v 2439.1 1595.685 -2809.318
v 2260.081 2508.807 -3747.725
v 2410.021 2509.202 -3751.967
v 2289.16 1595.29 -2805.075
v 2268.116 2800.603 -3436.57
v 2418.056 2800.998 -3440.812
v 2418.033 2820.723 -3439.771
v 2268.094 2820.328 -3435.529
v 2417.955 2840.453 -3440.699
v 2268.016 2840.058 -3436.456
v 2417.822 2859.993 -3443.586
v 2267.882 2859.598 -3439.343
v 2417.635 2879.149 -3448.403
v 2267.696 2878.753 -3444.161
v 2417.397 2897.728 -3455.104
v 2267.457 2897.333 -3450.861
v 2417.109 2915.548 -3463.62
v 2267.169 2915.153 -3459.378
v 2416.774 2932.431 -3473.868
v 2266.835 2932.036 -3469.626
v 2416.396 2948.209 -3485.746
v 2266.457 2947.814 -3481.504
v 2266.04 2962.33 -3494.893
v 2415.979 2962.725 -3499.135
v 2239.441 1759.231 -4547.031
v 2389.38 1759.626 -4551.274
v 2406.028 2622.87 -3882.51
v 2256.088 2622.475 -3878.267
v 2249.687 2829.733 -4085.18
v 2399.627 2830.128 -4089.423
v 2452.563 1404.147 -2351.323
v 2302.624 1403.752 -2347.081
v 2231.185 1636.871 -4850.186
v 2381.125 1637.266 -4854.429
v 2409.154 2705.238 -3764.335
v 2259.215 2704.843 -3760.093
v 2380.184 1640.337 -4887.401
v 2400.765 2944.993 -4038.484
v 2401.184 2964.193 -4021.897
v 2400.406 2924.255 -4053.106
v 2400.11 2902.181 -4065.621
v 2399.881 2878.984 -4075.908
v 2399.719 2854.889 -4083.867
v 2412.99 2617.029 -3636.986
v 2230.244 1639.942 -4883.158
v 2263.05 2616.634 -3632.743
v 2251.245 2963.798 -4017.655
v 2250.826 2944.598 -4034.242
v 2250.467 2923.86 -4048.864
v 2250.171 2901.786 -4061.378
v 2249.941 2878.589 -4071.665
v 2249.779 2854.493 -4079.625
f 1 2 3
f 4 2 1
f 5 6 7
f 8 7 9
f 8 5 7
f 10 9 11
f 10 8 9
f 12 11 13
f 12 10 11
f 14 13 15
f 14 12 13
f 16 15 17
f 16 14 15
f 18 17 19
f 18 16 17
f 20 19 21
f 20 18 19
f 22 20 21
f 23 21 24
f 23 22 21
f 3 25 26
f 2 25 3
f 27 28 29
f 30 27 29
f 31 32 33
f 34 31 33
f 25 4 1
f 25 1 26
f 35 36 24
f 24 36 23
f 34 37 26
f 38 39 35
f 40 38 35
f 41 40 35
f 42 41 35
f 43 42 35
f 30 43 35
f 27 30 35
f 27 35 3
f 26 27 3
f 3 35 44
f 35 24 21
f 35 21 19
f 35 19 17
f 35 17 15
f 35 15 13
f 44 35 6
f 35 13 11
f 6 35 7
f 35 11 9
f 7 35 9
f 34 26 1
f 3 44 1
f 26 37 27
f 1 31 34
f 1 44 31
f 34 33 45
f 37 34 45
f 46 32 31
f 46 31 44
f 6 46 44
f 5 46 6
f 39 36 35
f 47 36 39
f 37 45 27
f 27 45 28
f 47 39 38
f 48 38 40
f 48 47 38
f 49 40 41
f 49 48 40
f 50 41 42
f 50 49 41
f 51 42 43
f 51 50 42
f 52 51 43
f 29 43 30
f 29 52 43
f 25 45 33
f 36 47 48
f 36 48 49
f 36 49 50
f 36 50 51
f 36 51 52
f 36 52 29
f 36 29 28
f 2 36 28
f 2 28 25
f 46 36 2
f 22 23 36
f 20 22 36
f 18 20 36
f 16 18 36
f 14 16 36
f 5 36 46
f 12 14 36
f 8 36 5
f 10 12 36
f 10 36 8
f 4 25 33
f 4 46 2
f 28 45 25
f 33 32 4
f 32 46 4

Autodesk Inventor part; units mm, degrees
sketch "Sketch1" plane through (0, 0, 0) normal (0, 0, 1) x (1, 0, 0)
  line L0 (2948.6488, 634.5525) -> (2841.4489, 559.4904)
  line L1 (2841.4489, 559.4904) -> (2956.2003, 395.6085)
  line L2 (2956.2003, 395.6085) -> (3063.4001, 470.6706)
  line L3 (1051.1773, 2444.1167) -> (976.8907, 2338.0244)
  line L4 (976.8907, 2338.0244) -> (1140.7211, 2223.3091)
  line L5 (1140.7211, 2223.3091) -> (1215.0077, 2329.4014)
  line L6 (-383.8501, 3232.1868) -> (-383.8501, 3052.6308)
  arc A0 (4065.9398, -2152.4924) -> (-383.8501, 3052.6308) centre (-4485.4868, -4958.3977) ccw
  arc A1 (1051.1773, 2444.1167) -> (-383.8501, 3232.1868) centre (-3980.604, -5017.8654) ccw
  arc A2 (2948.6488, 634.5525) -> (1215.0077, 2329.4014) centre (-4152.392, -4894.9339) ccw
  arc A3 (4300.883, -1939.8955) -> (3063.4001, 470.6706) centre (-4233.2291, -4798.0297) ccw
  arc A4 (4065.9398, -2152.4924) -> (4300.883, -1939.8955) centre (3657.2708, -1464.7499) ccw
  point P0 (0, 0)
  point P1 (4065.924, -2152.4924)
  point P2 (4065.924, -2152.4924)
  dimension "d8" = 9000
  dimension "d9" = 9000
  dimension "d10" = 9000
  dimension "d11" = 9000
  dimension "d12" = 800
ref_plane "Work Plane2" through (0, 0, -7900) normal (0, 0, 1) x (1, 0, 0)
ref_plane "Work Plane1" through (0, 0, 0) normal (0, 0, 1) x (1, 0, 0)
sketch "Sketch2" plane through (0, 0, -7900) normal (0, 0, 1) x (1, 0, 0)
  arc A0 (895.257, 3171.2695) -> (-383.8658, 4018.7524) centre (-4697.1096, -3880.3569) ccw projected
  line L0 (-383.8658, 4018.7524) -> (-383.8658, 3839.1061) projected
  arc A1 (4065.924, -2152.4924) -> (-383.8658, 3839.1061) centre (-4733.9746, -4039.7614) ccw projected
  line L1 (895.257, 3171.2695) -> (830.4728, 3059.0601) projected
  line L2 (830.4728, 3059.0601) -> (1003.6891, 2959.0536) projected
  line L3 (1068.4733, 3071.2631) -> (1003.6891, 2959.0536) projected
  arc A2 (2750.1419, 1279.62) -> (1068.4733, 3071.2631) centre (-4591.4319, -3926.2703) ccw projected
  line L4 (2750.1419, 1279.62) -> (2643.8882, 1205.2246) projected
  line L5 (2643.8882, 1205.2246) -> (2759.146, 1041.7698) projected
  line L6 (2865.5448, 1116.2711) -> (2759.146, 1041.7698) projected
  arc A3 (4310.9102, -1926.005) -> (2865.5448, 1116.2711) centre (-4397.3898, -4198.7812) ccw projected
  arc A4 (4065.924, -2152.4924) -> (4310.9102, -1926.005) centre (3657.2831, -1464.7333) ccw
  point P0 (0, 0)
  dimension "d7" = 800
loft "Loft1" add profiles "Sketch1", "Sketch2"
ref_plane "Work Plane3" through (2500, 0, 0) normal (1, 0, 0) x (0, 1, 0)
sketch "Sketch3" plane through (2500, 0, 0) normal (1, 0, 0) x (0, 1, 0)
  line L0 (2569.5835, -3718.0946) -> (1551.2045, -2616.5476)
  line L1 (1551.2045, -2616.5476) -> (1738.7871, -4630.7013)
  line L2 (1738.7871, -4630.7013) -> (2569.5835, -3718.0946)
  line L3 (4228.9662, 279.606) -> (-2269.9695, 279.606)
  line L4 (-2269.9695, 279.606) -> (-2269.9695, -8192.2559)
  line L5 (-2269.9695, -8192.2559) -> (4228.9662, -8192.2559)
  line L6 (4228.9662, -8192.2559) -> (4228.9662, 279.606)
  point P0 (0, 0)
extrude "Extrusion1" cut sketch "Sketch3" along normal through all both and the other way through all
ref_plane "Work Plane4" through (1945.737, 1551.2045, -2616.5476) normal (0, -0.9956912, -0.0927309) x (1, 0, 0)
sketch "Sketch5" plane through (1945.737, 1551.2045, -2616.5476) normal (0, -0.9956912, -0.0927309) x (1, 0, 0)
  line L0 (347.8734, 0) -> (290.3896, -2022.8698)
  point P0 (-1945.737, 2749.1181)
ref_plane "Work Plane5" through (2293.6104, 1551.2045, -2616.5476) normal (-0.6425282, -0.7644369, -0.052856) x (-0.0284055, 0.0926935, -0.9952894)
sketch "Sketch6" plane through (2293.6104, 1551.2045, -2616.5476) normal (-0.6425282, -0.7644369, -0.052856) x (-0.0284055, 0.0926935, -0.9952894)
  line L0 (-1061.9028, -2252.9112) -> (2197.0944, -2252.9112)
  line L1 (2197.0944, -2252.9112) -> (2197.0944, 343.7273)
  line L2 (2197.0944, 343.7273) -> (-1061.9028, 343.7273)
  line L3 (-1061.9028, 343.7273) -> (-1061.9028, -2252.9112)
  point P0 (-2682.8576, -979.2829)
extrude "Extrusion2" cut sketch "Sketch6" against normal through all
ref_plane "Work Plane6" through (2293.6104, 1551.2045, -2616.5476) normal (-0.9995965, -0.0026341, 0.0282831) x (-0.0284055, 0.0926935, -0.9952894)
sketch "Sketch7" plane through (2293.6104, 1551.2045, -2616.5476) normal (-0.6425282, -0.7644369, -0.052856) x (-0.0284055, 0.0926935, -0.9952894)
  line L0 (0, 0) -> (1222.5973, -1418.5767) projected
  line L1 (1222.5973, -1418.5767) -> (2023.6864, 0) projected
  point P0 (-2682.8576, -979.2829)
sketch "Sketch8" plane through (2293.6104, 1551.2045, -2616.5476) normal (-0.9995965, -0.0026341, 0.0282831) x (-0.0284055, 0.0926935, -0.9952894)
  line L0 (0, 0) -> (1222.5973, -911.8435) projected
  spline S0 degree 4 poles (2023.6864, 0) (1891.4174, -0.0605) (1759.1485, -0.1112) (1626.8795, -0.1518) (1361.543, -0.2126) (1228.4756, -0.2325) (1095.4081, -0.2417) (831.8573, -0.2379) (701.374, -0.2253) (570.8907, -0.2017) (330.3055, -0.1374) (220.2037, -0.0999) (110.1018, -0.0542) (0, 0) knots 0 0 0 0 0 0.261442 0.261442 0.261442 0.524462 0.524462 0.524462 0.782374 0.782374 0.782374 1 1 1 1 1 projected
  line L1 (1222.5973, -911.8435) -> (2023.6864, 0) projected
  point P0 (-2682.8576, 1301.8858)
loft "Loft2" add profiles "Sketch8" section 1 edges at (1733.119, 2060.394, -3167.3211) (2264.5827, 1645.2339, -3623.5941) (1704.3771, 2154.1853, -4174.3979)
sketch "Sketch9" plane through (2293.6104, 1551.2045, -2616.5476) normal (-0.9995965, -0.0026341, 0.0282831) x (-0.0284055, 0.0926935, -0.9952894)
  line L0 (1222.5973, -911.8435) -> (0, 0) projected
  line L1 (2023.6864, 0) -> (1222.5973, -911.8435) projected
  spline S0 degree 4 poles (0, 0) (110.1018, -0.0542) (220.2037, -0.0999) (330.3055, -0.1374) (570.8907, -0.2017) (701.374, -0.2253) (831.8573, -0.2379) (1095.4081, -0.2417) (1228.4756, -0.2325) (1361.543, -0.2126) (1626.8795, -0.1518) (1759.1485, -0.1112) (1891.4174, -0.0605) (2023.6864, 0) knots 0 0 0 0 0 0.217626 0.217626 0.217626 0.475538 0.475538 0.475538 0.738558 0.738558 0.738558 1 1 1 1 1 projected
  point P0 (-2682.8576, 1301.8858)
extrude "Extrusion3" add sketch "Sketch9" against normal blind 1
sketch "Sketch10" plane through (2294.61, 1551.2071, -2616.5759) normal (0.9995965, 0.0026341, -0.0282831) x (-0.0284055, 0.0926935, -0.9952894)
  line L0 (2023.6864, 0) -> (1222.5973, 911.8435) projected
  line L1 (1222.5973, 911.8435) -> (0, 0) projected
  point P0 (-2682.8576, -1301.8858)
sketch "Sketch11" plane through (2294.61, 1551.2071, -2616.5759) normal (0.9995965, 0.0026341, -0.0282831) x (-0.0284055, 0.0926935, -0.9952894)
  line L0 (-1104.2744, 1764.8294) -> (3009.0866, 1764.8294)
  line L1 (3009.0866, 1764.8294) -> (3009.0866, -1120.984)
  line L2 (3009.0866, -1120.984) -> (-1104.2744, -1120.984)
  line L3 (-1104.2744, -1120.984) -> (-1104.2744, 1764.8294)
  point P0 (-2682.8576, -1301.8858)
extrude "Extrusion4" cut sketch "Sketch11" against normal through all
ref_plane "Work Plane7" through (2259.8815, 2572.4485, -3748.8579) normal (-0.9995965, -0.0026341, 0.0282831) x (0.02277, -0.6695833, 0.7423878)
sketch "Sketch12" plane through (2259.8815, 2572.4485, -3748.8579) normal (-0.9995965, -0.0026341, 0.0282831) x (0.02277, -0.6695833, 0.7423878)
  line L0 (1824.1754, 71.0087) -> (-191.8191, -1432.5702)
  line L1 (-191.8191, -1432.5702) -> (-218.3749, -1452.3762)
  line L2 (1355.6088, -93.5273) -> (-48.5024, -1138.6261)
  line L3 (-48.5024, -1138.6261) -> (43.4592, -46.5069)
  line L4 (-218.3749, -1452.3762) -> (-129.6551, -49.5311)
  line L5 (1824.1754, 71.0087) -> (56.688, 110.5959)
  line L6 (56.688, 110.5959) -> (79.2582, 378.6347)
  line L7 (-129.6551, -49.5311) -> (-422.1869, -34.2052)
  line L8 (-97.0049, 90.8023) -> (-72.3771, 459.6792)
  line L9 (-97.0049, 90.8023) -> (-461.7897, 110.5959)
  arc A0 (-461.7897, 110.5959) -> (-422.1869, -34.2052) centre (-203.8576, 103.3236) ccw
  arc A1 (79.2582, 378.6347) -> (-72.3771, 459.6792) centre (-80.6938, 261.7407) ccw
  line L10 (43.4592, -46.5069) -> (1355.6088, -93.5273)
  point P0 (4454.1178, 560.366)
  point P1 (0, 0)
  point P2 (1525.1894, 0)
  point P3 (-97.0049, -1209.8729)
  point P4 (1451.8368, -21.9036)
extrude "Extrusion5" add sketch "Sketch12" against normal blind 150
ref_plane "Work Plane8" through (2334.8512, 2572.6461, -3750.9792) normal (-0.9995965, -0.0026341, 0.0282831) x (0.02277, -0.6695833, 0.7423878)
sketch "Sketch14" plane through (2334.8512, 2572.6461, -3750.9792) normal (-0.9995965, -0.0026341, 0.0282831) x (0.02277, -0.6695833, 0.7423878)
  line L0 (1451.8368, -21.9036) -> (43.4592, -46.5069) projected
  line L1 (43.4592, -46.5069) -> (-48.5024, -1138.6261) projected
  line L2 (-48.5024, -1138.6261) -> (1355.6088, -93.5273) projected
  line L3 (-48.5024, -1138.6261) -> (43.4592, -46.5069) projected
  line L4 (36.357, -130.8518) -> (1354.1445, -94.6172)
  line L5 (29.9819, -206.5611) -> (1254.1697, -169.0298)
  line L6 (23.4479, -284.1574) -> (1145.7195, -249.7507)
  line L7 (16.9375, -361.4743) -> (1037.66, -330.1809)
  line L8 (11.2021, -429.586) -> (925.5677, -413.6127)
  line L9 (5.2661, -500.0812) -> (833.993, -481.773)
  line L10 (5.2661, -580.2648) -> (718.4048, -567.8068)
  line L11 (5.2661, -580.2648) -> (-1.4957, -580.383)
  line L12 (-7.9772, -657.3559) -> (615.2506, -644.5859)
  line L13 (-14.4897, -734.6974) -> (512.2276, -721.2673)
  line L14 (-20.8834, -810.6278) -> (426.4206, -798.3271)
  line L15 (-26.6611, -879.2427) -> (308.1889, -873.136)
  line L16 (-32.3399, -946.6834) -> (221.1278, -937.9367)
  line L17 (-37.3457, -1006.1304) -> (133.6992, -1003.011)
  line L18 (-41.9227, -1060.4869) -> (56.4792, -1060.4869)
  line L19 (1355.6088, -93.5273) -> (-48.5024, -1138.6261) projected
  line L20 (116.3671, -52.6461) -> (14.2049, -1091.9522)
  line L21 (190.5781, -52.6461) -> (82.9233, -1040.8042)
  line L22 (190.5781, -52.6461) -> (191.5287, -43.9202)
  line L23 (116.3671, -52.6461) -> (117.0971, -45.2205)
  line L24 (264.8096, -42.6401) -> (168.5004, -977.108)
  line L25 (335.0568, -41.4129) -> (244.4471, -920.5799)
  line L26 (405.5718, -40.181) -> (320.6833, -863.8362)
  line L27 (43.4592, -46.5069) -> (1451.8368, -21.9036) projected
  line L28 (494.8216, -38.6219) -> (401.4074, -815.2786)
  line L29 (584.5837, -37.0538) -> (494.8216, -734.2227)
  line L30 (673.0821, -35.5078) -> (584.5837, -667.4116)
  line L31 (761.0304, -33.9714) -> (682.5265, -594.5115)
  line L32 (845.2654, -32.4999) -> (776.3341, -524.6893)
  line L33 (922.1945, -31.156) -> (862.0055, -460.9229)
  line L34 (1000.074, -29.7955) -> (948.7353, -396.3688)
  line L35 (1079.0786, -28.4154) -> (1030.8888, -335.2208)
  line L36 (1150.7176, -27.1639) -> (1111.7893, -275.0055)
  line L37 (1222.0396, -25.918) -> (1192.3317, -215.0567)
  line L38 (1300.3477, -24.55) -> (1272.1344, -155.6584)
  line L39 (1372.2211, -23.2944) -> (1361.9285, -88.8235)
  point P0 (4454.1178, 560.366)
  point P1 (108.8756, -128.8578)
  point P2 (182.4957, -126.8335)
  point P3 (174.2918, -202.1368)
  point P4 (101.4529, -204.3699)
  point P5 (79.4317, -428.3941)
  point P6 (149.7761, -427.1652)
  point P7 (142.1618, -497.0569)
  point P8 (72.531, -498.5951)
  point P9 (49.4829, -733.0662)
  point P10 (116.6363, -731.354)
  point P11 (108.3871, -807.0729)
  point P12 (42.0287, -808.8978)
  point P13 (256.3417, -124.803)
  point P14 (326.6617, -122.8694)
  point P15 (318.9492, -197.7019)
  point P16 (248.6062, -199.8585)
  point P17 (240.6042, -277.4998)
  point P18 (310.9472, -275.3432)
  point P19 (302.9741, -352.7049)
  point P20 (232.6311, -354.8615)
  point P21 (225.3153, -425.8456)
  point P22 (295.5625, -424.6184)
  point P23 (288.4297, -493.8255)
  point P24 (218.149, -495.3782)
  point P25 (209.7685, -576.6923)
  point P26 (280.0157, -575.4652)
  point P27 (272.1674, -651.6157)
  point P28 (201.8983, -653.0555)
  point P29 (194.032, -729.3806)
  point P30 (264.3374, -727.5879)
  point P31 (256.5654, -802.9981)
  point P32 (186.2454, -804.9319)
  point P33 (750.2112, -111.2233)
  point P34 (834.565, -108.9039)
  point P35 (824.2986, -182.2089)
  point P36 (739.9073, -184.7961)
  point P37 (729.0212, -262.5259)
  point P38 (813.4125, -259.9386)
  point P39 (802.5656, -337.3884)
  point P40 (718.1743, -339.9757)
  point P41 (707.3275, -417.4252)
  point P42 (791.5625, -415.9537)
  point P43 (782.1842, -482.9175)
  point P44 (697.8945, -484.7796)
  point P45 (911.6025, -106.7856)
  point P46 (989.5918, -104.6412)
  point P47 (979.3944, -177.4539)
  point P48 (901.3704, -179.846)
  point P49 (890.4843, -257.5757)
  point P50 (968.5083, -255.1837)
  point P51 (957.6614, -332.6335)
  point P52 (879.6374, -335.0256)
  point P53 (1067.4421, -102.5006)
  point P54 (1139.1944, -100.5276)
  point P55 (1127.8264, -172.9033)
  point P56 (1056.0383, -175.1042)
  point P57 (515.7923, -571.3463)
  point P58 (598.2394, -569.906)
  point P59 (587.7014, -645.1504)
  point P60 (506.0746, -646.8229)
  point P61 (535.2229, -420.4317)
  point P62 (619.3793, -418.9616)
  point P63 (609.8891, -486.7239)
  point P64 (526.4503, -488.5672)
  point P65 (554.8662, -267.8651)
  point P66 (640.9098, -265.2272)
  point P67 (630.0629, -342.677)
  point P68 (544.8979, -345.288)
  point P69 (574.4119, -116.0572)
  point P70 (662.139, -113.645)
  point P71 (651.7959, -187.4975)
  point P72 (564.8706, -190.1624)
  point P73 (350.5307, -574.2333)
  point P74 (430.5679, -572.8351)
  point P75 (421.4603, -648.5567)
  point P76 (342.7044, -650.1704)
  point P77 (366.0774, -423.3866)
  point P78 (448.7168, -421.9429)
  point P79 (440.4749, -490.4665)
  point P80 (358.9784, -492.267)
  point P81 (381.5584, -273.1784)
  point P82 (466.9246, -270.5613)
  point P83 (457.6148, -347.964)
  point P84 (373.5852, -350.5401)
  point P85 (397.2497, -120.9285)
  point P86 (485.2129, -118.5098)
  point P87 (476.268, -192.8788)
  point P88 (389.5603, -195.5371)
  point P89 (35.2249, -878.1141)
  point P90 (100.7778, -876.9186)
  point P91 (93.6509, -942.3357)
  point P92 (28.6916, -944.5773)
  point P93 (64.6049, -579.2282)
  point P94 (133.3405, -578.0275)
  point P95 (124.9949, -654.6313)
  point P96 (57.0561, -656.0234)
  point P97 (93.822, -281.9999)
  point P98 (165.8317, -279.7922)
  point P99 (157.402, -357.1679)
  point P100 (86.2186, -359.3502)
  point P101 (56.4792, -1060.4869)
  point P102 (17.2979, -1060.4869)
  point P103 (22.7488, -1005.0344)
  point P104 (86.9478, -1003.8636)
  point P105 (172.3641, -939.6195)
  point P106 (178.9732, -875.4925)
  point P107 (249.226, -874.2113)
  point P108 (244.4471, -920.5799)
  point P109 (402.9301, -802.6189)
  point P110 (403.37, -798.961)
  point P111 (327.1535, -801.0569)
  point P112 (334.9109, -725.7885)
  point P113 (412.4087, -723.8124)
  point P114 (408.0161, -798.8332)
  point P115 (496.4378, -721.6699)
  point P116 (682.5265, -594.5115)
  point P117 (686.1876, -568.3696)
  point P118 (862.0055, -460.9229)
  point P119 (868.4916, -414.6098)
  point P120 (1030.8888, -335.2208)
  point P121 (1043.8229, -252.8747)
  point P122 (1115.611, -250.6738)
  point P123 (1111.7893, -275.0055)
  point P124 (1199.2969, -170.7121)
  point P125 (1210.6292, -98.5634)
  point P126 (1284.8599, -96.5223)
  point P127 (1272.1344, -155.6584)
properties part number "panel_block_02" material "Wood (Maple)"
